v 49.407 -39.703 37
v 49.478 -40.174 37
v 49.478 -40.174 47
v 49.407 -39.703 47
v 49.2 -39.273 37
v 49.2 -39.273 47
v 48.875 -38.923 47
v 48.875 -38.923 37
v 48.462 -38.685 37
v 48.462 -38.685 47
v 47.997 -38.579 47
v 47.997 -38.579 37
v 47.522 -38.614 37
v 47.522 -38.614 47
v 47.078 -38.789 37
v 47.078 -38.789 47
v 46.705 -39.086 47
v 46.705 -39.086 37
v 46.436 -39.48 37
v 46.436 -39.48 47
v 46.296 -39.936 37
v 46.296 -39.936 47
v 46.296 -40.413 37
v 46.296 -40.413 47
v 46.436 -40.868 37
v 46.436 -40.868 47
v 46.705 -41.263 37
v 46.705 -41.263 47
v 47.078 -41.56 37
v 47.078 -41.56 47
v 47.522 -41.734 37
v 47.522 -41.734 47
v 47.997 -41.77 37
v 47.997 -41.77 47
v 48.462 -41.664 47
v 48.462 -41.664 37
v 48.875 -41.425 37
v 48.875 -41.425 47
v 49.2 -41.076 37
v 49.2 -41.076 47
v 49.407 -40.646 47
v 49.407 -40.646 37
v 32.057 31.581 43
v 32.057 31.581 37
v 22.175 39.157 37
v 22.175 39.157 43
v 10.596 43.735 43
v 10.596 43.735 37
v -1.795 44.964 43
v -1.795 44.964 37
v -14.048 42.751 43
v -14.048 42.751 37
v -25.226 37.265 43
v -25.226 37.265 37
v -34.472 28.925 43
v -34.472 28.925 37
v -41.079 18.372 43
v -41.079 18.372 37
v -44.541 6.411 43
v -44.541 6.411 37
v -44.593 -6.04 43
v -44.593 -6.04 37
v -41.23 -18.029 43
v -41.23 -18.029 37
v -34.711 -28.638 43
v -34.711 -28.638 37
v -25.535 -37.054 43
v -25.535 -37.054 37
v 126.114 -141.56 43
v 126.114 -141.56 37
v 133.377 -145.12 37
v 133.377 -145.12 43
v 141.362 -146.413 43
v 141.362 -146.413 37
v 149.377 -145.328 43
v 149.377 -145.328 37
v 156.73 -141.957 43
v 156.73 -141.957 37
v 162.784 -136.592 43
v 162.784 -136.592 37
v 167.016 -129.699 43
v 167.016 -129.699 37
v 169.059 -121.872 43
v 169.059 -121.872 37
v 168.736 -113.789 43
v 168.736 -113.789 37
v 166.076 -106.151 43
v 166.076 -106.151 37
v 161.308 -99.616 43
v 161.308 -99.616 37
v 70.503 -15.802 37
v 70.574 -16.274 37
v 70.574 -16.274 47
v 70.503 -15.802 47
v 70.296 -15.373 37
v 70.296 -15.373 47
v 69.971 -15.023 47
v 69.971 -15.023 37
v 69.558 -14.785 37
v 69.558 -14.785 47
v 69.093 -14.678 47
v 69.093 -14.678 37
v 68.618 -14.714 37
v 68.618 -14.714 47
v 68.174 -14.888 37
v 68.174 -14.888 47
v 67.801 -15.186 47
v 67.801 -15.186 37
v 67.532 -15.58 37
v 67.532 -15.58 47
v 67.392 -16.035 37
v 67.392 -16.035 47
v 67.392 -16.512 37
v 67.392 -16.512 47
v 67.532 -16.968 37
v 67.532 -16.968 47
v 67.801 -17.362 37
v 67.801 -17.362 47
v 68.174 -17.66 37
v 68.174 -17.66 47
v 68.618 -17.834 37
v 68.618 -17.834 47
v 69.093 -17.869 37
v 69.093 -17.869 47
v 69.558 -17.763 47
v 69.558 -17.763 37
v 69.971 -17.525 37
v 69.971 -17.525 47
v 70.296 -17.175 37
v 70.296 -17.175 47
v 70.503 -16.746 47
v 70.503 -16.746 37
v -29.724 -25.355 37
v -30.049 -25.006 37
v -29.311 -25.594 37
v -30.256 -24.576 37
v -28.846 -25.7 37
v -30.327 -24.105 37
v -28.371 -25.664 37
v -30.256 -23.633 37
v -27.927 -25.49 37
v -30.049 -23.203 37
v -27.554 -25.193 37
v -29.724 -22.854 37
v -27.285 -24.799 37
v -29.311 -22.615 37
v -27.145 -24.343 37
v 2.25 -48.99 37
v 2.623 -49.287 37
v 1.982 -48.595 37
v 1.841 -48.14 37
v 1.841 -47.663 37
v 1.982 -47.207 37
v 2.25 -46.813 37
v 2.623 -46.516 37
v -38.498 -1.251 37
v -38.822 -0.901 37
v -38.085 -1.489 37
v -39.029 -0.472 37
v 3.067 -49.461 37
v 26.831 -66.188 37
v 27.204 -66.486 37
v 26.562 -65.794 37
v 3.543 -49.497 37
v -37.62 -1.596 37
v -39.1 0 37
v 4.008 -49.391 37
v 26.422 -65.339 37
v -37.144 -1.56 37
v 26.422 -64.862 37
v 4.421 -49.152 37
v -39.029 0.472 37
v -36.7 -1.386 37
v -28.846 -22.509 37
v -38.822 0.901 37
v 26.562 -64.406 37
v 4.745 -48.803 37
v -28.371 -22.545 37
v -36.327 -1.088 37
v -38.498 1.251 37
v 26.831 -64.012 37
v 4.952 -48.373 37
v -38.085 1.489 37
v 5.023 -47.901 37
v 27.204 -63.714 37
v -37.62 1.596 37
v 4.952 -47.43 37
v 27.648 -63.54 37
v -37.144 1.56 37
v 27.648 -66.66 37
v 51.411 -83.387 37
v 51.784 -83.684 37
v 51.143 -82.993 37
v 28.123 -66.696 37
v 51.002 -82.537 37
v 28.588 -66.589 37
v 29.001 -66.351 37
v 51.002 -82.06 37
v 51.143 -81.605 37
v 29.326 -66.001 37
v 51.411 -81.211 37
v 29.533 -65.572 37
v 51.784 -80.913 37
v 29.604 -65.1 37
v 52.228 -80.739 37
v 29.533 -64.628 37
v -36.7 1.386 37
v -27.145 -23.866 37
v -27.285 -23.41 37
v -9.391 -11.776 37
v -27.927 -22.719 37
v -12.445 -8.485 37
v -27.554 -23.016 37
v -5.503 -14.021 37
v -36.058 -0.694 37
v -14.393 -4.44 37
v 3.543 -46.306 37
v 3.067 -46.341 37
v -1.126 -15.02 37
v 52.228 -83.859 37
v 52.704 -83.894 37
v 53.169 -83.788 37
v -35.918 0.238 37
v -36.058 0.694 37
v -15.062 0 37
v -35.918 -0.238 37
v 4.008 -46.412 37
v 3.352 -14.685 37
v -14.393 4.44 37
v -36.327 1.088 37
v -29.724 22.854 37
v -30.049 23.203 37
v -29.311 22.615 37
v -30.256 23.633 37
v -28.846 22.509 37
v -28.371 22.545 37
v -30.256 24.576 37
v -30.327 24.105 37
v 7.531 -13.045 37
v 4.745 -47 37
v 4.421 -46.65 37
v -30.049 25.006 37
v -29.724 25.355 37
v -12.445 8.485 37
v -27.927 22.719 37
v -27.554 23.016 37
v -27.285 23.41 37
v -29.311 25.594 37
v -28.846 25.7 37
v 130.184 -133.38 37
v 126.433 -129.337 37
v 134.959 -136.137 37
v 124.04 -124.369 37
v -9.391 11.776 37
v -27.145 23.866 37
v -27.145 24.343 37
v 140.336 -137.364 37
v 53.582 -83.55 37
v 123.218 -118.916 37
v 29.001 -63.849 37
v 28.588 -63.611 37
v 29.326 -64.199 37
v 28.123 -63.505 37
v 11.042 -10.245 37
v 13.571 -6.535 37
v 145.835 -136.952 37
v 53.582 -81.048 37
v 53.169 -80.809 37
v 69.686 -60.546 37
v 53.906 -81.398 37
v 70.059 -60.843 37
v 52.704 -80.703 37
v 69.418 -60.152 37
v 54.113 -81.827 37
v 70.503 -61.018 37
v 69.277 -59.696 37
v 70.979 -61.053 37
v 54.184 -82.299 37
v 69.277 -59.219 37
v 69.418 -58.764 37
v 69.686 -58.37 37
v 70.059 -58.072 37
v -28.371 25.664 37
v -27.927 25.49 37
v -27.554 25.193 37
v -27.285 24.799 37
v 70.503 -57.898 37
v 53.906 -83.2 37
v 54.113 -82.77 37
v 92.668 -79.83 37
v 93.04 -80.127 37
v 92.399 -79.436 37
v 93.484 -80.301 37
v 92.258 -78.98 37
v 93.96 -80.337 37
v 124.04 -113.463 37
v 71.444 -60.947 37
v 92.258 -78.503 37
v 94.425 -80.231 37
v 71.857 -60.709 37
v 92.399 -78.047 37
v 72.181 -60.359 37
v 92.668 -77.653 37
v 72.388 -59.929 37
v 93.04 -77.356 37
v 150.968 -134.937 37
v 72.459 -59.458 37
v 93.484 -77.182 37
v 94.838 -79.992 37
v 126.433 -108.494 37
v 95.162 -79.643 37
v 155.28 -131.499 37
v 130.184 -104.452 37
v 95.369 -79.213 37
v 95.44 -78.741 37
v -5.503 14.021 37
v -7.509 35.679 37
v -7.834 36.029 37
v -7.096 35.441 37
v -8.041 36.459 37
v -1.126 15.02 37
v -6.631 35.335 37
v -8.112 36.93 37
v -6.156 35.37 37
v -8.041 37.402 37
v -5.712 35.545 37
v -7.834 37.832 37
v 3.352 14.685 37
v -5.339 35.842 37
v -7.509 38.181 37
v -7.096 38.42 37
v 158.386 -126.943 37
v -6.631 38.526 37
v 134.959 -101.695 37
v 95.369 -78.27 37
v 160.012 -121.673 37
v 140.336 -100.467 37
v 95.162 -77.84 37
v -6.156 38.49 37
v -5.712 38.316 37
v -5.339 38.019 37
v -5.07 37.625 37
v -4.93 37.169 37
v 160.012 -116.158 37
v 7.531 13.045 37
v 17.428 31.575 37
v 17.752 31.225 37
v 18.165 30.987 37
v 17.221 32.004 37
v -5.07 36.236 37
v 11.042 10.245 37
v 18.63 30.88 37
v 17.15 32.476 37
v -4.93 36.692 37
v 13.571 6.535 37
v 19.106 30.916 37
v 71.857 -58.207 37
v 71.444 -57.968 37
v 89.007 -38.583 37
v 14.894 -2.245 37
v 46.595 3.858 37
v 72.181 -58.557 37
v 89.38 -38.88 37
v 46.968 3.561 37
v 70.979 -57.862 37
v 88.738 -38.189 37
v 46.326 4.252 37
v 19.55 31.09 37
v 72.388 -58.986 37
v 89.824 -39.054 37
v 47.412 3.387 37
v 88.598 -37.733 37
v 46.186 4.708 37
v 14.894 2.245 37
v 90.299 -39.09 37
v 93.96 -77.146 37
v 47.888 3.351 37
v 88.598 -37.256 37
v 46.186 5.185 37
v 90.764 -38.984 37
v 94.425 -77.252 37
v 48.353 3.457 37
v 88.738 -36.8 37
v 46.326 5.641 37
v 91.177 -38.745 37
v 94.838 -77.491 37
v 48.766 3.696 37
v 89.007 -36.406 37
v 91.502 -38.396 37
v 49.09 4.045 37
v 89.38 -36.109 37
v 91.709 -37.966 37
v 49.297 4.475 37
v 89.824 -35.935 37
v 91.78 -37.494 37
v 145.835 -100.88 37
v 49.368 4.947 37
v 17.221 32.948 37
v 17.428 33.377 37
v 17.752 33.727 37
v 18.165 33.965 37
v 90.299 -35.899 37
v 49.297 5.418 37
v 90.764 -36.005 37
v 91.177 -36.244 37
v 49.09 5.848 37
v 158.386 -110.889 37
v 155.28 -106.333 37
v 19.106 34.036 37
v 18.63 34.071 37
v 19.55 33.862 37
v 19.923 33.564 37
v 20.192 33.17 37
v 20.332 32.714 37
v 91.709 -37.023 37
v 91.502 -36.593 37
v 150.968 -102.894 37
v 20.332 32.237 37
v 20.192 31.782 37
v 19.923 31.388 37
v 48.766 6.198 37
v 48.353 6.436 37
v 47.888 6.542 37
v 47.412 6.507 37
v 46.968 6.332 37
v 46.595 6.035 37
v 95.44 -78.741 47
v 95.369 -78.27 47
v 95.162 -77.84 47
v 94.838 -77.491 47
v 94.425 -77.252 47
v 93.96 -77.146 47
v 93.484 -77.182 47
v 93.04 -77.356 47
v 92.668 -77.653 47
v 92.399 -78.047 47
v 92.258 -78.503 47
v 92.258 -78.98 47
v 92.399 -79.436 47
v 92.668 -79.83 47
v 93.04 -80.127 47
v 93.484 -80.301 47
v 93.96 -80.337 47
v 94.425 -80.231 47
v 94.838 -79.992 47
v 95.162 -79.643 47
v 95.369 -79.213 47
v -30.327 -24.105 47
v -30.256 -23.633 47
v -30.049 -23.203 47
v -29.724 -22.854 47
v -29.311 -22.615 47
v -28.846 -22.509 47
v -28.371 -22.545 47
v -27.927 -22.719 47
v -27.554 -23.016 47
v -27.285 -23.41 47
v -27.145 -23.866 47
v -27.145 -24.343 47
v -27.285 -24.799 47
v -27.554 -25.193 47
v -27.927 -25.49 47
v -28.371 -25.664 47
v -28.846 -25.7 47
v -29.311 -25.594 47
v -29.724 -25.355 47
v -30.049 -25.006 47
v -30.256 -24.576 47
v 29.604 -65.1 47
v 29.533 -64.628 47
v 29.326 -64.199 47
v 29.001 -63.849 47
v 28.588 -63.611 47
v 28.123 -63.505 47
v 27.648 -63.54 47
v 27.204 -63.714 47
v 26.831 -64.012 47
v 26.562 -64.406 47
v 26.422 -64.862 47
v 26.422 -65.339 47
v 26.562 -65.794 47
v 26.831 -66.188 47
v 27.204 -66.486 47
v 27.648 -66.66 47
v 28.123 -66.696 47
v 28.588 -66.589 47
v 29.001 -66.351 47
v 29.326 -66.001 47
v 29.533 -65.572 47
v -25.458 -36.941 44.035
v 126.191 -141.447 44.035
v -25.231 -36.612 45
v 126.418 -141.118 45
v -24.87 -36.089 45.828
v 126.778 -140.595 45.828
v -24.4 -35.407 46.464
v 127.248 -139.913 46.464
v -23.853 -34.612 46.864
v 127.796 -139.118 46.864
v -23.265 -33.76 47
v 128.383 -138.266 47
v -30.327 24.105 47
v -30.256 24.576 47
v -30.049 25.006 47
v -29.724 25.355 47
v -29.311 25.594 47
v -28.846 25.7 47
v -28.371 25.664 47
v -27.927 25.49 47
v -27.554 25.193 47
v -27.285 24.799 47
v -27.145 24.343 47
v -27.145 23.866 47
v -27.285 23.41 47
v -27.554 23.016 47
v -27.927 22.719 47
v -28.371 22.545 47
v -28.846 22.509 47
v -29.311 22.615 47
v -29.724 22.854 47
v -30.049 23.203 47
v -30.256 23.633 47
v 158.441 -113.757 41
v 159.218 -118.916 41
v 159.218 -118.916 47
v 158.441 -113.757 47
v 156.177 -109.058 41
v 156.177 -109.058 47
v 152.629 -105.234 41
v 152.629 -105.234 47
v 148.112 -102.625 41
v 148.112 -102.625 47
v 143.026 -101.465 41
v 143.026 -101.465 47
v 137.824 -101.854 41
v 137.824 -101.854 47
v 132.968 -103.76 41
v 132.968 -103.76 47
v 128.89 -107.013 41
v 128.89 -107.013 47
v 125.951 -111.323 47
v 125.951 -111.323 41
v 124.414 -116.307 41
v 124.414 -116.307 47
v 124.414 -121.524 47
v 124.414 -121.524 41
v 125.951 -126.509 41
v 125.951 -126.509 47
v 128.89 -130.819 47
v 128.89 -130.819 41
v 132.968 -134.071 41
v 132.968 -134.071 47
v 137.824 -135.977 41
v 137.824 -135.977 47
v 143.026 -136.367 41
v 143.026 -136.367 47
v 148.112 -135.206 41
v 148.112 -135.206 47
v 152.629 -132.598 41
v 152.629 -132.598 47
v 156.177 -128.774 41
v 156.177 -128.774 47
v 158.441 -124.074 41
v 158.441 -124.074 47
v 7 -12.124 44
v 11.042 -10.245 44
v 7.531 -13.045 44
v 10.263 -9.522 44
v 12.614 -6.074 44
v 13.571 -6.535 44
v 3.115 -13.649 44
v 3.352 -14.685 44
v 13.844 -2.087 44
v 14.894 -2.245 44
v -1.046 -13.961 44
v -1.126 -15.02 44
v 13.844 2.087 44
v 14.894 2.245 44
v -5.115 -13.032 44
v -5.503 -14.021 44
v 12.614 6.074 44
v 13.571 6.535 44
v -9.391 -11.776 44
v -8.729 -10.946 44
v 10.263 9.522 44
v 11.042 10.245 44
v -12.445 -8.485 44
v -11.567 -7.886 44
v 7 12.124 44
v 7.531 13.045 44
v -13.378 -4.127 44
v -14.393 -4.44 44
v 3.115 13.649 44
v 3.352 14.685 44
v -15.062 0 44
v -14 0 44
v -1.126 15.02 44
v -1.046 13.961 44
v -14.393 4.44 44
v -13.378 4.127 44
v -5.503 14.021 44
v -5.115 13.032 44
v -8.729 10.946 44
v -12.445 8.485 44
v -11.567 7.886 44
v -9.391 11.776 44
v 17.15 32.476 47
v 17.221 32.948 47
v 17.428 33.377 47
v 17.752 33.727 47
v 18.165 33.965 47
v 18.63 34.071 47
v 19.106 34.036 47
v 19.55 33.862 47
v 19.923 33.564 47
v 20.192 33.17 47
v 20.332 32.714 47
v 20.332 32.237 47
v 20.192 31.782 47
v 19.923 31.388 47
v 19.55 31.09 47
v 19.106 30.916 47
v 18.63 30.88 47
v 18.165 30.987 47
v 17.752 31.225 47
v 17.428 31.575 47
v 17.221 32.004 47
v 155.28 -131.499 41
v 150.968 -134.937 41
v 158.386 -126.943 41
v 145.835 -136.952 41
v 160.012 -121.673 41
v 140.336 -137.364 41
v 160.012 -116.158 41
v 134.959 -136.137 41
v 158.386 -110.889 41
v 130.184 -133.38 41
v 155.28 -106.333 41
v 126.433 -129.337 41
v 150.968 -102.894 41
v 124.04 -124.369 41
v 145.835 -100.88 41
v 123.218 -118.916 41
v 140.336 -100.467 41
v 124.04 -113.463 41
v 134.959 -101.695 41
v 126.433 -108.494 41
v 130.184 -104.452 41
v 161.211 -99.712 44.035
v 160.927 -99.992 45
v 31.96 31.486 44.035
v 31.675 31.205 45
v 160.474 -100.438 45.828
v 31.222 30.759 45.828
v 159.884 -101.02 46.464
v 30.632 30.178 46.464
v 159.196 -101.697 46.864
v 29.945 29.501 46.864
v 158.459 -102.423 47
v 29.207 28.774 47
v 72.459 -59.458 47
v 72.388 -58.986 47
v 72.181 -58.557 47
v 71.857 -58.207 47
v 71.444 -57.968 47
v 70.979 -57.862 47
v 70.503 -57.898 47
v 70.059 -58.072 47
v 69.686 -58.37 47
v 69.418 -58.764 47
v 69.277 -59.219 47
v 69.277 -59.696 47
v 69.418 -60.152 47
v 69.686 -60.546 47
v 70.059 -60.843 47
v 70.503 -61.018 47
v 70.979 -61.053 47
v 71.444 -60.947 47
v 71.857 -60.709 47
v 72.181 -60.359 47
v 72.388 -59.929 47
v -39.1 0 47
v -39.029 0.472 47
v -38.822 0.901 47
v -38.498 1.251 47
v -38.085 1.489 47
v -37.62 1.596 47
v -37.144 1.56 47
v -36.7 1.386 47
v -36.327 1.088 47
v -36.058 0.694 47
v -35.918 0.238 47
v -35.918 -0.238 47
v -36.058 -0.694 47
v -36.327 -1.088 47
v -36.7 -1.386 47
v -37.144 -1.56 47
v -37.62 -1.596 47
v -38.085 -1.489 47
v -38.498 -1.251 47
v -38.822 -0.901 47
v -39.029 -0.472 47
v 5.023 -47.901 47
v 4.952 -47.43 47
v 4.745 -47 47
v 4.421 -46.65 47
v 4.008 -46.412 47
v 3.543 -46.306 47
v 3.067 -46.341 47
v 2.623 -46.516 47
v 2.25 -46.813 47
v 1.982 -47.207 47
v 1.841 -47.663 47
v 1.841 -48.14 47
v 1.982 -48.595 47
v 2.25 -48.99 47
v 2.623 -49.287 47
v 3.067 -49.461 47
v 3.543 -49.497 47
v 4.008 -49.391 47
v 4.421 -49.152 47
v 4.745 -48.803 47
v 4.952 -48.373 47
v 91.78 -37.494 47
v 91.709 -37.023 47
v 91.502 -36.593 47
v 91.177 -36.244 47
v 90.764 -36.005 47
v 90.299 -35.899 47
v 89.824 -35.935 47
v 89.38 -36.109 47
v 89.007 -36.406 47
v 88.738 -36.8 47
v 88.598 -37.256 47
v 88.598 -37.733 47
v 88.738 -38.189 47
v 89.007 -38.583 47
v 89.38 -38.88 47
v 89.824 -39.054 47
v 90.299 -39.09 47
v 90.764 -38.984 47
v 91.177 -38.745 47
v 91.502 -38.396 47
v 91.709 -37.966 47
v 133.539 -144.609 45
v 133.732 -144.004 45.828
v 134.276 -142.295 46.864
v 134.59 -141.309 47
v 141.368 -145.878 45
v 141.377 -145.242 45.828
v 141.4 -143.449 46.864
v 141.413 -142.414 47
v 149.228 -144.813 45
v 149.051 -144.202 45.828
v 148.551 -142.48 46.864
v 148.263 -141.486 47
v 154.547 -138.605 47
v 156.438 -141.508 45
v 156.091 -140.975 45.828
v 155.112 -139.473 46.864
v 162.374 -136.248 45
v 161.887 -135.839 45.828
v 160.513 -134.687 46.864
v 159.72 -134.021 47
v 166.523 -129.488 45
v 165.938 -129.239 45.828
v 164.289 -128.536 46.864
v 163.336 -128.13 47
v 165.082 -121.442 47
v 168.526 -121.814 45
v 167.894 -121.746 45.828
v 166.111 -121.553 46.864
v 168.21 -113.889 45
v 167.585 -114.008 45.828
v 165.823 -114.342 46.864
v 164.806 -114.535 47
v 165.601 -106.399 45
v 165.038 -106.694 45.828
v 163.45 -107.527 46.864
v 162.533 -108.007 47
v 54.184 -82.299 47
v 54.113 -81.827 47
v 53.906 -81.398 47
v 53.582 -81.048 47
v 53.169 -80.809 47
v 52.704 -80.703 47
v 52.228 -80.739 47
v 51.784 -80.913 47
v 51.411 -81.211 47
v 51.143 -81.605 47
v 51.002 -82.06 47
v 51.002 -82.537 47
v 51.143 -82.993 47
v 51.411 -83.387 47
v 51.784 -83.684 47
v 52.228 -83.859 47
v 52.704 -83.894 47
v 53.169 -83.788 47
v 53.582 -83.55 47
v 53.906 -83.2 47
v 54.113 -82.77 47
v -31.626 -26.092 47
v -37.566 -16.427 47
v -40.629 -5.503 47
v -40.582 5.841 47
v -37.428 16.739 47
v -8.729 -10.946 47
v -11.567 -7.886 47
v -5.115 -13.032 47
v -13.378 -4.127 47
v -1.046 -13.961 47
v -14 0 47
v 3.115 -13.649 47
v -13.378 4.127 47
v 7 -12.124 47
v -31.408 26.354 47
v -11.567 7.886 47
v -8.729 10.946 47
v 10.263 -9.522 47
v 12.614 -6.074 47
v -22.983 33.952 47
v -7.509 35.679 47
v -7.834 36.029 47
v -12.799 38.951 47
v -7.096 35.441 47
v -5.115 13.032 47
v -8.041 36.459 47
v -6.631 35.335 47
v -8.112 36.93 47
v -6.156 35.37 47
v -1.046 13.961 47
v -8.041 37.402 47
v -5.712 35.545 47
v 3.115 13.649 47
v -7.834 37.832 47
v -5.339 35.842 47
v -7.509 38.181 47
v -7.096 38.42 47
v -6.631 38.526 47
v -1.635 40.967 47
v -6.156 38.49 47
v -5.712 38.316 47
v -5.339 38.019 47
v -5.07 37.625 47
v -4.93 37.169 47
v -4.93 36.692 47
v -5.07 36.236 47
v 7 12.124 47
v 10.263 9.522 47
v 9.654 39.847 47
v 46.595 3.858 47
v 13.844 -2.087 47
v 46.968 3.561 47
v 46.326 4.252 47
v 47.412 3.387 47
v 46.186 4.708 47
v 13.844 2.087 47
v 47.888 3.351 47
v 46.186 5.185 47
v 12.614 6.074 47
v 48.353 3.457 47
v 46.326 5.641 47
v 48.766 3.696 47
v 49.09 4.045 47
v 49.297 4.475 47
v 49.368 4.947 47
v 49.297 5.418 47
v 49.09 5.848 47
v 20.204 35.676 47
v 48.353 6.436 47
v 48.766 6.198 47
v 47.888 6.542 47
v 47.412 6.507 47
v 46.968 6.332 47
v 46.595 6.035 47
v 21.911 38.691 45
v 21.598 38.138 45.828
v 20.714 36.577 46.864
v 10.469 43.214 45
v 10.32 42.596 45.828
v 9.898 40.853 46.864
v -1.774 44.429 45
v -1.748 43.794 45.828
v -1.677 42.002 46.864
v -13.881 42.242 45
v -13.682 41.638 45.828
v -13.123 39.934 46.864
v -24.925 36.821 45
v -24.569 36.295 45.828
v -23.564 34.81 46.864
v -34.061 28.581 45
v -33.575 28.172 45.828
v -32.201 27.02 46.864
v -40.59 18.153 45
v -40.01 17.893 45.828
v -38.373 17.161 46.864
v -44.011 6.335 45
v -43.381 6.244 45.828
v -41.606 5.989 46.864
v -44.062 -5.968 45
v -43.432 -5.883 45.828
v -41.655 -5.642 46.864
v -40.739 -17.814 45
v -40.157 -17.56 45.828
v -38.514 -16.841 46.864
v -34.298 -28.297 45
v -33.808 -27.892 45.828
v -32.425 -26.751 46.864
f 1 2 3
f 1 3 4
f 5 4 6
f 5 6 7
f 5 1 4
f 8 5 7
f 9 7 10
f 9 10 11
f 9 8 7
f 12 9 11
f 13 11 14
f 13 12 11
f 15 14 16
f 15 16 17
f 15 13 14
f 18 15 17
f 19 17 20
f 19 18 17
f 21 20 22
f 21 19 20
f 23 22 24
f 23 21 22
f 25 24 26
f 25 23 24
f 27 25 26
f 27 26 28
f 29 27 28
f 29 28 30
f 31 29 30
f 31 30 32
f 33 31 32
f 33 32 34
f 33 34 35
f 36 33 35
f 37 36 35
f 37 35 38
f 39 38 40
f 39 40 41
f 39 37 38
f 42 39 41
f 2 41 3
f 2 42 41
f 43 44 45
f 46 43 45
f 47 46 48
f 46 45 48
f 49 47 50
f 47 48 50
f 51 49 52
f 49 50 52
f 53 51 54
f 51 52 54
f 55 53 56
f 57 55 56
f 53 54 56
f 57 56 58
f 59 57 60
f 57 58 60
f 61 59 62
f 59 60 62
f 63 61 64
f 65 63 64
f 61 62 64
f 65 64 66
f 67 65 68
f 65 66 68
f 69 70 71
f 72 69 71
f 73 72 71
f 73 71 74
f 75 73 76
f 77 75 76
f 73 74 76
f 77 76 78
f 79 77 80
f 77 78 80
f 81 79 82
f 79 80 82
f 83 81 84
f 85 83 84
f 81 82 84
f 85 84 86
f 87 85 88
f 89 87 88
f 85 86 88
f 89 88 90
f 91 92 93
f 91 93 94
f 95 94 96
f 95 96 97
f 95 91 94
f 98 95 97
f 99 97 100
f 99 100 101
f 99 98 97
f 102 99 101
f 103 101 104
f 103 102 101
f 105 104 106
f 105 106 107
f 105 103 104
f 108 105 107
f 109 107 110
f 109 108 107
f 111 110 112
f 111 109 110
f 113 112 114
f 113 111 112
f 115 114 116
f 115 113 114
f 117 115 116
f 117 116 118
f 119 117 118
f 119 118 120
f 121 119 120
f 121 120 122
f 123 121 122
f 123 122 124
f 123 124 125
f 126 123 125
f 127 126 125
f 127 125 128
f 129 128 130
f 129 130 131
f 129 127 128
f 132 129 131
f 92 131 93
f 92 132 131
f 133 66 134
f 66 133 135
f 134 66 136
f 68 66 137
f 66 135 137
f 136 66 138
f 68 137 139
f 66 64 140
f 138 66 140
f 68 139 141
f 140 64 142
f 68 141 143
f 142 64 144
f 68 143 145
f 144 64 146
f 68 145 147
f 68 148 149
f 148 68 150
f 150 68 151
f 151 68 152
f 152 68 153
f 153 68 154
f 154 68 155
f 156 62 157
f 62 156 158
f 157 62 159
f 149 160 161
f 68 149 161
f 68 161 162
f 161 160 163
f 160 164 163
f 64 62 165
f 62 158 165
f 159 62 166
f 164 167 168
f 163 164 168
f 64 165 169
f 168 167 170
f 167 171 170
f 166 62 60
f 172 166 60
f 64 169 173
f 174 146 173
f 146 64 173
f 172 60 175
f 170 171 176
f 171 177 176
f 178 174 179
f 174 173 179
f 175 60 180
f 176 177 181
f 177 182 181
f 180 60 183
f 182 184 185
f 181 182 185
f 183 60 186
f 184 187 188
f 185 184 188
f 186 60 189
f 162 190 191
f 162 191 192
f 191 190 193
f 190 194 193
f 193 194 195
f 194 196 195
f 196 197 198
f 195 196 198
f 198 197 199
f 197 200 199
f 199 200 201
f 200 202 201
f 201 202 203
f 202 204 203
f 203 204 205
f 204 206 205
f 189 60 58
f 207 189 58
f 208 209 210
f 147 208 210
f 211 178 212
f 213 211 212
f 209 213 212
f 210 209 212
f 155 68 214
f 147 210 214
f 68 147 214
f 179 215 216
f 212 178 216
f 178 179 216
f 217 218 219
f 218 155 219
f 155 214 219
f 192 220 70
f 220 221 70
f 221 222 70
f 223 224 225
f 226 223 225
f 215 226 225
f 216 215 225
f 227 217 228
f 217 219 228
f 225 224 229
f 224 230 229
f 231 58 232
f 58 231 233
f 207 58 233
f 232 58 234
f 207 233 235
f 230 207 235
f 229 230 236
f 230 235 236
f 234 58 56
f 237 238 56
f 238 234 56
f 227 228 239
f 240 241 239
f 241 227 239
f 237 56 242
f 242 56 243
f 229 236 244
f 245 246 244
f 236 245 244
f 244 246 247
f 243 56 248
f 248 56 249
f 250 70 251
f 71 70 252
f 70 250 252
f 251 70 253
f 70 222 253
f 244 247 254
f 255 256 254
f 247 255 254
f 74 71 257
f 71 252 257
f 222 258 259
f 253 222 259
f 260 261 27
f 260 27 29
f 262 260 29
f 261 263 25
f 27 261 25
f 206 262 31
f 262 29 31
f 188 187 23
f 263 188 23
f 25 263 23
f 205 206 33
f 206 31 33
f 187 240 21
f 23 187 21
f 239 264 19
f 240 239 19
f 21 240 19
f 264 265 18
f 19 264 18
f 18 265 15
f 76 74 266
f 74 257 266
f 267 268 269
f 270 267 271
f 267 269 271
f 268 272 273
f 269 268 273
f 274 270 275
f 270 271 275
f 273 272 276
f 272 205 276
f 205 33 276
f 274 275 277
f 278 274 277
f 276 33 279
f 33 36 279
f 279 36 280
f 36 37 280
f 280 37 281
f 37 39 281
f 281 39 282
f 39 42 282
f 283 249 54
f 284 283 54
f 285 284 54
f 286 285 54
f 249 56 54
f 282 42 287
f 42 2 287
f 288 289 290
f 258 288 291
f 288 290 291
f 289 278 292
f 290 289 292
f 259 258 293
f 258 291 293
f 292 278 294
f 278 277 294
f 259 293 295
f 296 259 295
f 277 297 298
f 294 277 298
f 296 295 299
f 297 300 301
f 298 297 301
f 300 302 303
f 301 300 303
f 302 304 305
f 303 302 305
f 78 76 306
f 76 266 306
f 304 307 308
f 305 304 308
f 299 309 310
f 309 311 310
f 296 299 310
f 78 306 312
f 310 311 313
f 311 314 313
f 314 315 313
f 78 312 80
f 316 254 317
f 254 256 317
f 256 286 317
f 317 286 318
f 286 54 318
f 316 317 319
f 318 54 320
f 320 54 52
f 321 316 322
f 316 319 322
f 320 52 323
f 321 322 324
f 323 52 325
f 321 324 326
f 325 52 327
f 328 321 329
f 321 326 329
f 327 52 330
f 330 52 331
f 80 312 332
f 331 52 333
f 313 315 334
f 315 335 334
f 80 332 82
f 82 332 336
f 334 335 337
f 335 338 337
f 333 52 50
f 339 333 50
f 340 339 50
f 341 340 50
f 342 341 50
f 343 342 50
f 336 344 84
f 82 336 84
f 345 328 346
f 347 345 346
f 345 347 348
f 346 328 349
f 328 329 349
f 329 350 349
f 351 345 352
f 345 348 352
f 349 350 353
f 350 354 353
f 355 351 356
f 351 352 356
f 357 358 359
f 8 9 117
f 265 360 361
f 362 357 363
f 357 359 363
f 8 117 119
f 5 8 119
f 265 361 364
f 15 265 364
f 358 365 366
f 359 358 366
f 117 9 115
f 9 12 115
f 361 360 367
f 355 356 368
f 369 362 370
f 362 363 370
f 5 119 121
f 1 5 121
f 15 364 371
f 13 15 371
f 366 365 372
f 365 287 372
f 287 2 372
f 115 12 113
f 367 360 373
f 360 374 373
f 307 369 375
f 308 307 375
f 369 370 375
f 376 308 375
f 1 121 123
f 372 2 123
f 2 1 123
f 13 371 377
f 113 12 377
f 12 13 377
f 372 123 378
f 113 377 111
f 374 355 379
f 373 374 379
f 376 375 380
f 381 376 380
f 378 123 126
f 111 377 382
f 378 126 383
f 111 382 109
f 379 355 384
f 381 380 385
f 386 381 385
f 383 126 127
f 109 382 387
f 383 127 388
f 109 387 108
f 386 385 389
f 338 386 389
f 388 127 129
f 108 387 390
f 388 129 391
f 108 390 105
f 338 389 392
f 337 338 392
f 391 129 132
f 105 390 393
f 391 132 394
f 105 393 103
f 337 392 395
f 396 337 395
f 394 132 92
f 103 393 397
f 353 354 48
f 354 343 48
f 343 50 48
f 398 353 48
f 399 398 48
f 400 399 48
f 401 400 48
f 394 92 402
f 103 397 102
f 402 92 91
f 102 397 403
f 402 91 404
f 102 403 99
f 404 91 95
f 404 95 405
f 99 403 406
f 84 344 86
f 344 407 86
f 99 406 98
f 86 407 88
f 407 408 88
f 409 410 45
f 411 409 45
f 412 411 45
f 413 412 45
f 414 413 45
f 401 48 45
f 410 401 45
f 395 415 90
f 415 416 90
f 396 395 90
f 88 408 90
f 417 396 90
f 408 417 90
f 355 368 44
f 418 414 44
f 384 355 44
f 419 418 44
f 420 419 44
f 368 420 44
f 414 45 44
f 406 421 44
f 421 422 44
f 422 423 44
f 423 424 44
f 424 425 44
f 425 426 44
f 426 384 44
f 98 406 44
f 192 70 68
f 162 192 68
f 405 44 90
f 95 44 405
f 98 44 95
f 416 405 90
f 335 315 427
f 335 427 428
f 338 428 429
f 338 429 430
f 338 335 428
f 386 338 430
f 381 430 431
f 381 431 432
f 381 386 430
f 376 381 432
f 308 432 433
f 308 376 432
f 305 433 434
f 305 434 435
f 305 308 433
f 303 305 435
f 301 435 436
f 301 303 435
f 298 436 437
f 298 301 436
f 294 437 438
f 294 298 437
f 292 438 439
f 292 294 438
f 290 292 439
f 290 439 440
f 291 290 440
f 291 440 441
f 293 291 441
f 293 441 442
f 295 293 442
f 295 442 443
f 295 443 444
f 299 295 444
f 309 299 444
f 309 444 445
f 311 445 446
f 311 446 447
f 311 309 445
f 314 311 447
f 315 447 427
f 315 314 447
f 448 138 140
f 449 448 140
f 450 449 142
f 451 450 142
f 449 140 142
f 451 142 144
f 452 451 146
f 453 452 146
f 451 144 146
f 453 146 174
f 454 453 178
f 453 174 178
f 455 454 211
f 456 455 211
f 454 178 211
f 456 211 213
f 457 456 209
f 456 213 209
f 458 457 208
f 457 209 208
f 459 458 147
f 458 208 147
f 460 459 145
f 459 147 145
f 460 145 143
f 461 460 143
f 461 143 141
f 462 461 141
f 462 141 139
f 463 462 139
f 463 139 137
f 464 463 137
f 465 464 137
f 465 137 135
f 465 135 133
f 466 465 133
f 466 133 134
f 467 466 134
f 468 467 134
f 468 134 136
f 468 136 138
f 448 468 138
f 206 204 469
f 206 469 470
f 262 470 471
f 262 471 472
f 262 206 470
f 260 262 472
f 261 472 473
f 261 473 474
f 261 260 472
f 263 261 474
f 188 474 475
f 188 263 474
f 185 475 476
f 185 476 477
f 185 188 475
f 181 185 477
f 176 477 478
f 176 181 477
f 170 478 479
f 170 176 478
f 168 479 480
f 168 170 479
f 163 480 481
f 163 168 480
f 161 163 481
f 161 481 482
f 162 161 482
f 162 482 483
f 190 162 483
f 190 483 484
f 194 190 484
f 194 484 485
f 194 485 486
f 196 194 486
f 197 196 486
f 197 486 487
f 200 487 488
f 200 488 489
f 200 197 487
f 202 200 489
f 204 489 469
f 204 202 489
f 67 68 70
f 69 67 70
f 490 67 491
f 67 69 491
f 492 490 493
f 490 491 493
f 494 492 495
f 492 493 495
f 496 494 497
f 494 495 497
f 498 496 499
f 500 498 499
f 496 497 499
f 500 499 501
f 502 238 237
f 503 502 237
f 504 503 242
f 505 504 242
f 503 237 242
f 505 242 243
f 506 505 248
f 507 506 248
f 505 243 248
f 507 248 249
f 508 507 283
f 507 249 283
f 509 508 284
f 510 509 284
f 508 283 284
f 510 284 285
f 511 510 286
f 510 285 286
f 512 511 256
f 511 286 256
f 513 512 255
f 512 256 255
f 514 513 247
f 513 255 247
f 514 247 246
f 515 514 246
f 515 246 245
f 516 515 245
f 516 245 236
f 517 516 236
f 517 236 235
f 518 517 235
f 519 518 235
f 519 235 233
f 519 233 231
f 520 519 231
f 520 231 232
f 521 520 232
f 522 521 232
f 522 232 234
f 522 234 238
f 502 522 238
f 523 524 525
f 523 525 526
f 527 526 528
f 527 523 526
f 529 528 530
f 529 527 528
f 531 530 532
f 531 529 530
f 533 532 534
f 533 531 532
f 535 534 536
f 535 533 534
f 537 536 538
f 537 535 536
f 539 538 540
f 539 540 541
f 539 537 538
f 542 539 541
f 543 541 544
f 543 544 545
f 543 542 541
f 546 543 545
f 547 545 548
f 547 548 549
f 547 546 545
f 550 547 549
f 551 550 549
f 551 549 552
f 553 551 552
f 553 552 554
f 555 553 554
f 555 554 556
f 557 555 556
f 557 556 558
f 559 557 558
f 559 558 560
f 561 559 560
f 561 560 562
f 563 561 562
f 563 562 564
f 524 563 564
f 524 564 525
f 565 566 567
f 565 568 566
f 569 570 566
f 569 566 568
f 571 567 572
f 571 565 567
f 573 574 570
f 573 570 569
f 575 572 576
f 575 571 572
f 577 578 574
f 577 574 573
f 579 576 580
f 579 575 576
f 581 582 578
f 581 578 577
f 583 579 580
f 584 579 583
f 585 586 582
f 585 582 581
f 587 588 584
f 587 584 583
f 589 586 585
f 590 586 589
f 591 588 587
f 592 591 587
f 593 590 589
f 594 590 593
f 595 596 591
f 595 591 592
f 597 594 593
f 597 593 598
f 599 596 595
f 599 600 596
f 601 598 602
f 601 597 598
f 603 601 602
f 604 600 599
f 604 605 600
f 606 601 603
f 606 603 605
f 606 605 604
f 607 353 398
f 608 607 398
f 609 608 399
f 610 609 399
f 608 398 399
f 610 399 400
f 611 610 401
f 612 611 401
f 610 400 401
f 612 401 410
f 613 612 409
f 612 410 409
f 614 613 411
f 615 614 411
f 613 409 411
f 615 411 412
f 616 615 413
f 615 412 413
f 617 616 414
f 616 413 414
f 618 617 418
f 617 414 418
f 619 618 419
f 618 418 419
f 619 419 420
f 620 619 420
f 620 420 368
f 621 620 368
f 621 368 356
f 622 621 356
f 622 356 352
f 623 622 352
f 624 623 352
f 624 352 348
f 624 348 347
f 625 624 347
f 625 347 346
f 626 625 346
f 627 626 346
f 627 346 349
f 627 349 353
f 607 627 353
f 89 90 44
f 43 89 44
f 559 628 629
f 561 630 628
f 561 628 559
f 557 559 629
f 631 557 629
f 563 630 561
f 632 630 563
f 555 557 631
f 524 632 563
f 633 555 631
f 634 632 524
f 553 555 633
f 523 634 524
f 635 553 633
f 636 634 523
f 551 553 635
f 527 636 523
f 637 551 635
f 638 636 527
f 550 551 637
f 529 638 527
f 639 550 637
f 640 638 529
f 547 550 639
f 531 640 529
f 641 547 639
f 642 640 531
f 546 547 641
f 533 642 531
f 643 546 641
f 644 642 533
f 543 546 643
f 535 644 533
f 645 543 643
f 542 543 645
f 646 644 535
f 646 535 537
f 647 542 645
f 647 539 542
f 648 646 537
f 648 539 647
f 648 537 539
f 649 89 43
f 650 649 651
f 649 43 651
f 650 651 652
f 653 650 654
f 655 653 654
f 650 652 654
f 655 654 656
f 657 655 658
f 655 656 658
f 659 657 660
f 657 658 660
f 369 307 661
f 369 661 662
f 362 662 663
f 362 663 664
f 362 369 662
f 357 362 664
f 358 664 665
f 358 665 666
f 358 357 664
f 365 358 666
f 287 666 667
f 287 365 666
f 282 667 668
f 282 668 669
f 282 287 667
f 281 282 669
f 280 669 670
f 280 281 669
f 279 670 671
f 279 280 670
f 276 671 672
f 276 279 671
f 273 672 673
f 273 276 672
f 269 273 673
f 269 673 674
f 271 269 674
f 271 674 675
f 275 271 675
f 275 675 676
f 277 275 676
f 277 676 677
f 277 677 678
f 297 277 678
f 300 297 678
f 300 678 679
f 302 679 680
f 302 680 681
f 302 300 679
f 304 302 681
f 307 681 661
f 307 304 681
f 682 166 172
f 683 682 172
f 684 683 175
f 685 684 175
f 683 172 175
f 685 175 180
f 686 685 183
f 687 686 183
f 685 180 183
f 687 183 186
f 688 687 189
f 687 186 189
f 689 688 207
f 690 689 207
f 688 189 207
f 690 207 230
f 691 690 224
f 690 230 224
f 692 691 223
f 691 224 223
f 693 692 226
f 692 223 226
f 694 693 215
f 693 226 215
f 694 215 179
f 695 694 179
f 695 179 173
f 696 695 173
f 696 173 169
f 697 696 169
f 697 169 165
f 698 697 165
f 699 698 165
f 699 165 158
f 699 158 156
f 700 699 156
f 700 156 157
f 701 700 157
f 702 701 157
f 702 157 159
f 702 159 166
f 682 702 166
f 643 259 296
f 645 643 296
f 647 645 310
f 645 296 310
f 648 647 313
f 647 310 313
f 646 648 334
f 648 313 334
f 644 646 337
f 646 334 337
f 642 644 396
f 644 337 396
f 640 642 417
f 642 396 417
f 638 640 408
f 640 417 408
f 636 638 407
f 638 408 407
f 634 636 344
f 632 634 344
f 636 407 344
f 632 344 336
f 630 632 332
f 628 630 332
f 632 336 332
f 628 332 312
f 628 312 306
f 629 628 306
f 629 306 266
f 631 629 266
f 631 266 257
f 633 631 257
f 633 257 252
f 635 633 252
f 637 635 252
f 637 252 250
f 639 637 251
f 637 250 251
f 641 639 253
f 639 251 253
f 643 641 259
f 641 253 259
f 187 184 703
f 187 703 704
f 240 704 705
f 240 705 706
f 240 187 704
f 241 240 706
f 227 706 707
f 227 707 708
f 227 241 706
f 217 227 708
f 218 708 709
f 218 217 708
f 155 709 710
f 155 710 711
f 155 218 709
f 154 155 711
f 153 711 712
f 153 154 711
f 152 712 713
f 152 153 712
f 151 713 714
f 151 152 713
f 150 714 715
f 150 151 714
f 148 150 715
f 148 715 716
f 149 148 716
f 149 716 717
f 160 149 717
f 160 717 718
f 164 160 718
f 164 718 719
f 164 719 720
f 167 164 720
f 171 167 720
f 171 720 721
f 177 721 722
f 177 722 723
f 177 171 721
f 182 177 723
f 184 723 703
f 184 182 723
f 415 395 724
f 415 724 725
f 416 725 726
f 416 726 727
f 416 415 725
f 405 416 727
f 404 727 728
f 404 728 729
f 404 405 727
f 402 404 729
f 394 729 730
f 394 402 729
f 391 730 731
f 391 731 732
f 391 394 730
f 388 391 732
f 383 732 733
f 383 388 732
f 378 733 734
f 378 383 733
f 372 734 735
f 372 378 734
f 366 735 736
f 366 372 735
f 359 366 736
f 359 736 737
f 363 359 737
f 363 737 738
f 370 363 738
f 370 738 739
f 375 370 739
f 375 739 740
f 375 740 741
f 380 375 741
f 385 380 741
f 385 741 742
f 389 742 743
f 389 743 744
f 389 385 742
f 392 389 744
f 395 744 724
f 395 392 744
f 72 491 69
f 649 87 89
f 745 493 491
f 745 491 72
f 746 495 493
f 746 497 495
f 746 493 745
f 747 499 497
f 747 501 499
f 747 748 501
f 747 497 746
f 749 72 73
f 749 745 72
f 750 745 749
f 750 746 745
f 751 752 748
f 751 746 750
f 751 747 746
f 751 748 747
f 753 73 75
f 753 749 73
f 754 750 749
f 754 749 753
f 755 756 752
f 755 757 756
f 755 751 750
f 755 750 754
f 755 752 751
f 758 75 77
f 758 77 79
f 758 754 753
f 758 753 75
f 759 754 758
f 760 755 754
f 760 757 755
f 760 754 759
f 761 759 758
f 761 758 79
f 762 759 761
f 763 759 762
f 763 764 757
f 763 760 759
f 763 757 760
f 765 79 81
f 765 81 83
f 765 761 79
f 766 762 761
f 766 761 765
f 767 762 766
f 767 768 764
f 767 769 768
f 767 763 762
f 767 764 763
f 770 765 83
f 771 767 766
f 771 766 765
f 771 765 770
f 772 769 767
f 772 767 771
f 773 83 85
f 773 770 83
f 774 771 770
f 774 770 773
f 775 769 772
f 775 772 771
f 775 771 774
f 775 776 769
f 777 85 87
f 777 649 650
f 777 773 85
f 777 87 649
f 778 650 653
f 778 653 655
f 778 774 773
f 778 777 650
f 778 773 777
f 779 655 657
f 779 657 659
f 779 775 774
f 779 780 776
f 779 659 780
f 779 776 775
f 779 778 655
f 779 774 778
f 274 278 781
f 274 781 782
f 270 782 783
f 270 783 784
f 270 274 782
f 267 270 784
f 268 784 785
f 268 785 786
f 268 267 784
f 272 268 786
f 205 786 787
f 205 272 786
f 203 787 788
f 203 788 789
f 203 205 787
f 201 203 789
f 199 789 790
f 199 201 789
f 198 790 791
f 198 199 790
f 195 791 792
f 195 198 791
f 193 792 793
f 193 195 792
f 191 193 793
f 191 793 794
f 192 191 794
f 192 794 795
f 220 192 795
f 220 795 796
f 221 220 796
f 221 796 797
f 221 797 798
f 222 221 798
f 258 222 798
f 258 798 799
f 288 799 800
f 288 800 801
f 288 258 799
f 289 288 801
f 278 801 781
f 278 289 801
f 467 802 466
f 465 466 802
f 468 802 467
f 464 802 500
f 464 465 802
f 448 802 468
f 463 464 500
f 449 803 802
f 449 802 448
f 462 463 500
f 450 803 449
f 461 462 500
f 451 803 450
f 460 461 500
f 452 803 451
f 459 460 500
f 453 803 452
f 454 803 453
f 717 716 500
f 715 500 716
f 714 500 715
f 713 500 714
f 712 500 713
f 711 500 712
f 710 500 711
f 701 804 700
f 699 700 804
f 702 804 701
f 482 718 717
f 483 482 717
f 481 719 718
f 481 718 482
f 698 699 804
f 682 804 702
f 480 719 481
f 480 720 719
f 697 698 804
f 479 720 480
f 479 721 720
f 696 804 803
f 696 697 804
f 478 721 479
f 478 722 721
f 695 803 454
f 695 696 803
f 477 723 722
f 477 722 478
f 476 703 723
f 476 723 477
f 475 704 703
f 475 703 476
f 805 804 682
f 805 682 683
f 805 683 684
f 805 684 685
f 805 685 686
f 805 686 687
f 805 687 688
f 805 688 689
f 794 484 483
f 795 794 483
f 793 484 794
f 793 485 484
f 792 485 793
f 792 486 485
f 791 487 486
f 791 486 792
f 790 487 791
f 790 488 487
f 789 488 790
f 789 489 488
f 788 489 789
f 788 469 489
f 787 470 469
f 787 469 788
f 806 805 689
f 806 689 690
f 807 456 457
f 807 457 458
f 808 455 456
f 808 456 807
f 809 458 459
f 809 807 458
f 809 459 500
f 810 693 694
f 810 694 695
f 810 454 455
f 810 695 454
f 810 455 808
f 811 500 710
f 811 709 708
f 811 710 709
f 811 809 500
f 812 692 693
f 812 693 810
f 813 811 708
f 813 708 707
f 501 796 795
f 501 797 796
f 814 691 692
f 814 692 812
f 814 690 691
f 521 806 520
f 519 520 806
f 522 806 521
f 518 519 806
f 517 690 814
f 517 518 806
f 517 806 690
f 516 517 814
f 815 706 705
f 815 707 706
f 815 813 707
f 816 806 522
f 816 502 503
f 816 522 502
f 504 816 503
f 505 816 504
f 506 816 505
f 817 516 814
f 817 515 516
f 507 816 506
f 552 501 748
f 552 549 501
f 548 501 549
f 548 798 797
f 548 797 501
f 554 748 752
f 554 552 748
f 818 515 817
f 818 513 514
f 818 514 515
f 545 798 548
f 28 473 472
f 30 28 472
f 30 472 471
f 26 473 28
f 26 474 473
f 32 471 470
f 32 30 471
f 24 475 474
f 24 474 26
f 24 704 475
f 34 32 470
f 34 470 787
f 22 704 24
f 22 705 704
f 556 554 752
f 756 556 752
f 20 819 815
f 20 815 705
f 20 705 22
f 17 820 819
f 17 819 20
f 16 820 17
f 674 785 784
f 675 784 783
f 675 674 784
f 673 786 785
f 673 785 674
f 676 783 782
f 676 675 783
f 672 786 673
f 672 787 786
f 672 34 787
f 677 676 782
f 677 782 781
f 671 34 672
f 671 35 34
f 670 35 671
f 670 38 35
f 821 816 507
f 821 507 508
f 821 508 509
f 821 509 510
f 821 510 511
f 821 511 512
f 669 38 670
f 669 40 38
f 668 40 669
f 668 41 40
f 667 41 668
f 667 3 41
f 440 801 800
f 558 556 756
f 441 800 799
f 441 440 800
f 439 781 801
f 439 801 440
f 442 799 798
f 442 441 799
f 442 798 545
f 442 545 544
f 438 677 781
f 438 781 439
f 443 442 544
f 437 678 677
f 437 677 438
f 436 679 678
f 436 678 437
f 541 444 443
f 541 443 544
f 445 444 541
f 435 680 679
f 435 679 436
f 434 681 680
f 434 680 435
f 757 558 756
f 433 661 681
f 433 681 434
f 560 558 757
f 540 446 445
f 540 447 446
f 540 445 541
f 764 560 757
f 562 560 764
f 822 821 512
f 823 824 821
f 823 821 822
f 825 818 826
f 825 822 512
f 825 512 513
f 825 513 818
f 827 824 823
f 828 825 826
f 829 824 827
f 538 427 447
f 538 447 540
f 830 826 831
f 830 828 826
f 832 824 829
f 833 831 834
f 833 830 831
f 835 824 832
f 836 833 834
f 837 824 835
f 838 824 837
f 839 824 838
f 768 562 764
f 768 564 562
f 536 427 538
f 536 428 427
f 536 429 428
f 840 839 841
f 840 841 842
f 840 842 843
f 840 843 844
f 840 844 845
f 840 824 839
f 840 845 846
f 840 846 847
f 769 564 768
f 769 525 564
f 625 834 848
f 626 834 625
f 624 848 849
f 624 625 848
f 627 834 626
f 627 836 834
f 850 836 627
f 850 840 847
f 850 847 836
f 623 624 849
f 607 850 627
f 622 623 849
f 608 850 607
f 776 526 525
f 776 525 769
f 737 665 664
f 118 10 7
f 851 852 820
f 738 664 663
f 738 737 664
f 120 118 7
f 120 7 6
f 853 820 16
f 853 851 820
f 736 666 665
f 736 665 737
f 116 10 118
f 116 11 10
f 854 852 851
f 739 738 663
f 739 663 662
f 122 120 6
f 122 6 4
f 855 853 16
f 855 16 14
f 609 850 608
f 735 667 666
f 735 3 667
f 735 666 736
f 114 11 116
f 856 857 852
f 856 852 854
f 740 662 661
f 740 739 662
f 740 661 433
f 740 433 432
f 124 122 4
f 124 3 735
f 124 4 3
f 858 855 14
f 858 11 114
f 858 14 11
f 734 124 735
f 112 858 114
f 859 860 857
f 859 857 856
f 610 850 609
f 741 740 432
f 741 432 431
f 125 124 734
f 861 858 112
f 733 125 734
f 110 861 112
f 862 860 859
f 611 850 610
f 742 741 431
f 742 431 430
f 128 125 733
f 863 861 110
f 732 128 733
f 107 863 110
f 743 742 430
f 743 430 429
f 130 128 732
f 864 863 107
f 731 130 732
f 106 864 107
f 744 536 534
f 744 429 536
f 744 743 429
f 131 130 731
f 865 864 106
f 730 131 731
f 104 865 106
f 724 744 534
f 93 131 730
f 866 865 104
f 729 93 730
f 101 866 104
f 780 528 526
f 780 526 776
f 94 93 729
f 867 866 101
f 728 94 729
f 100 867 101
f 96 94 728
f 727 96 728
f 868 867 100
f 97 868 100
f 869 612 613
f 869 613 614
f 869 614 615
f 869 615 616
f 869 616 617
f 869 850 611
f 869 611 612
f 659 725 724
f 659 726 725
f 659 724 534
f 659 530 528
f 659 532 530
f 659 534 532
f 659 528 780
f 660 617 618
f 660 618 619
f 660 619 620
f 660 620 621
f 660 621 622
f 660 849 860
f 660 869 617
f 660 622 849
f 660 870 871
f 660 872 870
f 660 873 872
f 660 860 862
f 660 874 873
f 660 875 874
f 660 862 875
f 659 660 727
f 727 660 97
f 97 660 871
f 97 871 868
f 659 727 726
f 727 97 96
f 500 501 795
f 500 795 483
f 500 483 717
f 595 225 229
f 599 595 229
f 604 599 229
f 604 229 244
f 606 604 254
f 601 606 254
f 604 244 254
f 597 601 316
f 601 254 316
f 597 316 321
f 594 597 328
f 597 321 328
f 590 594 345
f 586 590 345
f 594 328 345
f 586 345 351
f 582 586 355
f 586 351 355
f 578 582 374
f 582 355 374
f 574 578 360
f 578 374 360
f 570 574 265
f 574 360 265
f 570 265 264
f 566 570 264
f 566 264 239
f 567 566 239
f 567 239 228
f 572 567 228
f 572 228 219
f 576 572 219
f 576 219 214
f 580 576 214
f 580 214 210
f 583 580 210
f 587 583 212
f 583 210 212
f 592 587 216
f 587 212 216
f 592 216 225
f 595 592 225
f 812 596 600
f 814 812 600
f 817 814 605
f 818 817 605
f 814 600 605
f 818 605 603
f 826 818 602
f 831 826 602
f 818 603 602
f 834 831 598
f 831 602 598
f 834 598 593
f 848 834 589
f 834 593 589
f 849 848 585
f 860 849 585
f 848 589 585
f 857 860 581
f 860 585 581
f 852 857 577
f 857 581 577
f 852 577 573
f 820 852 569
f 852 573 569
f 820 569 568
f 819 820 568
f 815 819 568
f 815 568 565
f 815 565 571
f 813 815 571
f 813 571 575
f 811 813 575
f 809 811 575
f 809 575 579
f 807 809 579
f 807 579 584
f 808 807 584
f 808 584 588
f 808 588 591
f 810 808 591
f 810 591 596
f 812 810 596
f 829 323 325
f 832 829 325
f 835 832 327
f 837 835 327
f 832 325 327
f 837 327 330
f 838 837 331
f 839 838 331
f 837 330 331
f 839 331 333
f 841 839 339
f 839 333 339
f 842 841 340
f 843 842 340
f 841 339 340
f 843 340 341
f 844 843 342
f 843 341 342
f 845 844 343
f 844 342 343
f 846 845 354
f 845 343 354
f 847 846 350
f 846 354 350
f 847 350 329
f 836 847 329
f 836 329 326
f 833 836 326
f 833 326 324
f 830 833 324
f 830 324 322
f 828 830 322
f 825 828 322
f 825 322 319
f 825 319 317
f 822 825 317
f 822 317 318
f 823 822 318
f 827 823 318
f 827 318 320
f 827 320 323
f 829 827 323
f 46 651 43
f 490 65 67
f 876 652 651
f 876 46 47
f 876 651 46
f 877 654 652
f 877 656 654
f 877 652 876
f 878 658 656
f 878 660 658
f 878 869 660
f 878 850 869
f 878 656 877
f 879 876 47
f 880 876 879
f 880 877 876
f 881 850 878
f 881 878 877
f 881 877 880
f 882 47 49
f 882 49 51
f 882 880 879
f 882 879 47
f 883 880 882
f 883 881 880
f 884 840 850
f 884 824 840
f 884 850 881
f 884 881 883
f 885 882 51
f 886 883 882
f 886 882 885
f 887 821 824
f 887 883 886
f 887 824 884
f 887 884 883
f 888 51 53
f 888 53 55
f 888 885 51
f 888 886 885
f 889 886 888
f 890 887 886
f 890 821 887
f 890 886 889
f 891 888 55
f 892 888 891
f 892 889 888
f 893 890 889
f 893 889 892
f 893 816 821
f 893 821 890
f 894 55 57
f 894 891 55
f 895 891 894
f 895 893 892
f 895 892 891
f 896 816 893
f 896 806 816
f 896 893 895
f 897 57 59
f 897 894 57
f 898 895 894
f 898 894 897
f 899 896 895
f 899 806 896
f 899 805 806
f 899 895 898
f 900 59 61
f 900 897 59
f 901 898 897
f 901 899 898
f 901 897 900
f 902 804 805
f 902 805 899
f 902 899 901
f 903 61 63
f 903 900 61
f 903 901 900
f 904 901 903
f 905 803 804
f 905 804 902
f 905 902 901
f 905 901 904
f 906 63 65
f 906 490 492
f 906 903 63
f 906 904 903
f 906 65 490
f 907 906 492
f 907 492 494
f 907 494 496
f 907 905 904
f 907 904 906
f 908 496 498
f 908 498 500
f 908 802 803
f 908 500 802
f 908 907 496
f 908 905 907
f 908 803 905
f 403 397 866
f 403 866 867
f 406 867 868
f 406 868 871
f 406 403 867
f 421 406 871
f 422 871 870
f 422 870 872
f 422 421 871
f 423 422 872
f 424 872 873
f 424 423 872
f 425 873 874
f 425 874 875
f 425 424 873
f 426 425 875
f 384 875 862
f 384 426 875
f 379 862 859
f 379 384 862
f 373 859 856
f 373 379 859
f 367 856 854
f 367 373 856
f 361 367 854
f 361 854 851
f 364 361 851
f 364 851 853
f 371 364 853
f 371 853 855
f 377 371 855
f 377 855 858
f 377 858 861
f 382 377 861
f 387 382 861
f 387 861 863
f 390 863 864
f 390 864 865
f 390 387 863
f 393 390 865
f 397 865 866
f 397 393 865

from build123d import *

# Parameters (mm, degrees)
SKETCH1_R           = 17.5
SKETCH1_R_2         = 1.6
BOSS_EXTRUDE1_DEPTH = 10
SKETCH2_R           = 18.5
CUT_EXTRUDE1_DEPTH  = 4
SKETCH3_R           = 1.6
CUT_EXTRUDE2_DEPTH  = 224.991888552
SKETCH4_R           = 14
CUT_EXTRUDE3_DEPTH  = 224.991888552
SKETCH4_3_R         = 15.0625
SKETCH4_3_R_2       = 14
CUT_EXTRUDE4_DEPTH  = 7
FILLET1_R           = 4


with BuildPart() as part:
    # Sketch1 → Boss-Extrude1 (new body)
    with BuildSketch(Plane.XY.offset(37)):
        with BuildLine():
            Line((-25.534872354, -37.053613776), (126.113577761, -141.559582877))
            ThreePointArc((126.113577761, -141.559582877), (162.784444163, -136.592367058), (161.308367688, -99.616065541))
            Line((161.308367688, -99.616065541), (32.056602073, 31.581232775))
            ThreePointArc((32.056602073, 31.581232775), (-34.47199994, 28.925442436), (-25.534872354, -37.053613776))
        make_face()
        with Locations((141.718221977, -118.915707792)):
            Circle(SKETCH1_R, mode=Mode.SUBTRACT)
        with Locations((70.859110989, -59.457853896)):
            Circle(SKETCH1_R_2, mode=Mode.SUBTRACT)
        with Locations((93.840444282, -78.741482187)):
            Circle(SKETCH1_R_2, mode=Mode.SUBTRACT)
        with Locations((47.877777695, -40.174225605)):
            Circle(SKETCH1_R_2, mode=Mode.SUBTRACT)
        with Locations((47.767990244, 4.946625931)):
            Circle(SKETCH1_R_2, mode=Mode.SUBTRACT)
        with Locations((3.423348889, -47.901259716)):
            Circle(SKETCH1_R_2, mode=Mode.SUBTRACT)
        with Locations((68.973861607, -16.273907044)):
            Circle(SKETCH1_R_2, mode=Mode.SUBTRACT)
        with Locations((90.17973297, -37.494440018)):
            Circle(SKETCH1_R_2, mode=Mode.SUBTRACT)
        with Locations((28.003855203, -65.100059364)):
            Circle(SKETCH1_R_2, mode=Mode.SUBTRACT)
        with Locations((52.584361518, -82.298859012)):
            Circle(SKETCH1_R_2, mode=Mode.SUBTRACT)
    extrude(amount=BOSS_EXTRUDE1_DEPTH)

    # Sketch2 → Cut-Extrude1 (cut)
    with BuildSketch(Plane(origin=(0, 0, 37), x_dir=(-1, 0, 0), z_dir=(0, 0, -1))):
        with Locations((-141.718221977, -118.915707792)):
            Circle(SKETCH2_R)
    extrude(amount=-CUT_EXTRUDE1_DEPTH, mode=Mode.SUBTRACT)

    # Sketch3 → Cut-Extrude2 (cut, through all)
    with BuildSketch(Plane(origin=(0, 0, 37), x_dir=(-1, 0, 0), z_dir=(0, 0, -1))):
        with Locations((-18.75, 32.475952642)):
            Circle(SKETCH3_R)
        with Locations((6.511806663, 36.930290738)):
            Circle(SKETCH3_R)
        with Locations((28.726666617, 24.104535363)):
            Circle(SKETCH3_R)
        with Locations((37.5, 0)):
            Circle(SKETCH3_R)
        with Locations((28.726666617, -24.104535363)):
            Circle(SKETCH3_R)
    extrude(amount=-CUT_EXTRUDE2_DEPTH, mode=Mode.SUBTRACT)

    # Sketch4 → Cut-Extrude3 (cut, through all)
    with BuildSketch(Plane(origin=(0, 0, 37), x_dir=(-1, 0, 0), z_dir=(0, 0, -1))):
        Circle(SKETCH4_R)
    extrude(amount=-CUT_EXTRUDE3_DEPTH, mode=Mode.SUBTRACT)

    # Sketch4<3> → Cut-Extrude4 (cut)
    with BuildSketch(Plane(origin=(0, 0, 37), x_dir=(-1, 0, 0), z_dir=(0, 0, -1))):
        Circle(SKETCH4_3_R)
        Circle(SKETCH4_3_R_2, mode=Mode.SUBTRACT)
    extrude(amount=-CUT_EXTRUDE4_DEPTH, mode=Mode.SUBTRACT)

    # Fillet1
    fillet1_edges = [part.edges().sort_by_distance(p)[0] for p in [
        (162.784444163, -136.592367058, 47),
        (96.68248488, -34.017416383, 47),
        (-34.47199994, 28.925442436, 47),
        (50.289352703, -89.306598327, 47),
    ]]
    fillet(fillet1_edges, radius=FILLET1_R)


solid = part.part
